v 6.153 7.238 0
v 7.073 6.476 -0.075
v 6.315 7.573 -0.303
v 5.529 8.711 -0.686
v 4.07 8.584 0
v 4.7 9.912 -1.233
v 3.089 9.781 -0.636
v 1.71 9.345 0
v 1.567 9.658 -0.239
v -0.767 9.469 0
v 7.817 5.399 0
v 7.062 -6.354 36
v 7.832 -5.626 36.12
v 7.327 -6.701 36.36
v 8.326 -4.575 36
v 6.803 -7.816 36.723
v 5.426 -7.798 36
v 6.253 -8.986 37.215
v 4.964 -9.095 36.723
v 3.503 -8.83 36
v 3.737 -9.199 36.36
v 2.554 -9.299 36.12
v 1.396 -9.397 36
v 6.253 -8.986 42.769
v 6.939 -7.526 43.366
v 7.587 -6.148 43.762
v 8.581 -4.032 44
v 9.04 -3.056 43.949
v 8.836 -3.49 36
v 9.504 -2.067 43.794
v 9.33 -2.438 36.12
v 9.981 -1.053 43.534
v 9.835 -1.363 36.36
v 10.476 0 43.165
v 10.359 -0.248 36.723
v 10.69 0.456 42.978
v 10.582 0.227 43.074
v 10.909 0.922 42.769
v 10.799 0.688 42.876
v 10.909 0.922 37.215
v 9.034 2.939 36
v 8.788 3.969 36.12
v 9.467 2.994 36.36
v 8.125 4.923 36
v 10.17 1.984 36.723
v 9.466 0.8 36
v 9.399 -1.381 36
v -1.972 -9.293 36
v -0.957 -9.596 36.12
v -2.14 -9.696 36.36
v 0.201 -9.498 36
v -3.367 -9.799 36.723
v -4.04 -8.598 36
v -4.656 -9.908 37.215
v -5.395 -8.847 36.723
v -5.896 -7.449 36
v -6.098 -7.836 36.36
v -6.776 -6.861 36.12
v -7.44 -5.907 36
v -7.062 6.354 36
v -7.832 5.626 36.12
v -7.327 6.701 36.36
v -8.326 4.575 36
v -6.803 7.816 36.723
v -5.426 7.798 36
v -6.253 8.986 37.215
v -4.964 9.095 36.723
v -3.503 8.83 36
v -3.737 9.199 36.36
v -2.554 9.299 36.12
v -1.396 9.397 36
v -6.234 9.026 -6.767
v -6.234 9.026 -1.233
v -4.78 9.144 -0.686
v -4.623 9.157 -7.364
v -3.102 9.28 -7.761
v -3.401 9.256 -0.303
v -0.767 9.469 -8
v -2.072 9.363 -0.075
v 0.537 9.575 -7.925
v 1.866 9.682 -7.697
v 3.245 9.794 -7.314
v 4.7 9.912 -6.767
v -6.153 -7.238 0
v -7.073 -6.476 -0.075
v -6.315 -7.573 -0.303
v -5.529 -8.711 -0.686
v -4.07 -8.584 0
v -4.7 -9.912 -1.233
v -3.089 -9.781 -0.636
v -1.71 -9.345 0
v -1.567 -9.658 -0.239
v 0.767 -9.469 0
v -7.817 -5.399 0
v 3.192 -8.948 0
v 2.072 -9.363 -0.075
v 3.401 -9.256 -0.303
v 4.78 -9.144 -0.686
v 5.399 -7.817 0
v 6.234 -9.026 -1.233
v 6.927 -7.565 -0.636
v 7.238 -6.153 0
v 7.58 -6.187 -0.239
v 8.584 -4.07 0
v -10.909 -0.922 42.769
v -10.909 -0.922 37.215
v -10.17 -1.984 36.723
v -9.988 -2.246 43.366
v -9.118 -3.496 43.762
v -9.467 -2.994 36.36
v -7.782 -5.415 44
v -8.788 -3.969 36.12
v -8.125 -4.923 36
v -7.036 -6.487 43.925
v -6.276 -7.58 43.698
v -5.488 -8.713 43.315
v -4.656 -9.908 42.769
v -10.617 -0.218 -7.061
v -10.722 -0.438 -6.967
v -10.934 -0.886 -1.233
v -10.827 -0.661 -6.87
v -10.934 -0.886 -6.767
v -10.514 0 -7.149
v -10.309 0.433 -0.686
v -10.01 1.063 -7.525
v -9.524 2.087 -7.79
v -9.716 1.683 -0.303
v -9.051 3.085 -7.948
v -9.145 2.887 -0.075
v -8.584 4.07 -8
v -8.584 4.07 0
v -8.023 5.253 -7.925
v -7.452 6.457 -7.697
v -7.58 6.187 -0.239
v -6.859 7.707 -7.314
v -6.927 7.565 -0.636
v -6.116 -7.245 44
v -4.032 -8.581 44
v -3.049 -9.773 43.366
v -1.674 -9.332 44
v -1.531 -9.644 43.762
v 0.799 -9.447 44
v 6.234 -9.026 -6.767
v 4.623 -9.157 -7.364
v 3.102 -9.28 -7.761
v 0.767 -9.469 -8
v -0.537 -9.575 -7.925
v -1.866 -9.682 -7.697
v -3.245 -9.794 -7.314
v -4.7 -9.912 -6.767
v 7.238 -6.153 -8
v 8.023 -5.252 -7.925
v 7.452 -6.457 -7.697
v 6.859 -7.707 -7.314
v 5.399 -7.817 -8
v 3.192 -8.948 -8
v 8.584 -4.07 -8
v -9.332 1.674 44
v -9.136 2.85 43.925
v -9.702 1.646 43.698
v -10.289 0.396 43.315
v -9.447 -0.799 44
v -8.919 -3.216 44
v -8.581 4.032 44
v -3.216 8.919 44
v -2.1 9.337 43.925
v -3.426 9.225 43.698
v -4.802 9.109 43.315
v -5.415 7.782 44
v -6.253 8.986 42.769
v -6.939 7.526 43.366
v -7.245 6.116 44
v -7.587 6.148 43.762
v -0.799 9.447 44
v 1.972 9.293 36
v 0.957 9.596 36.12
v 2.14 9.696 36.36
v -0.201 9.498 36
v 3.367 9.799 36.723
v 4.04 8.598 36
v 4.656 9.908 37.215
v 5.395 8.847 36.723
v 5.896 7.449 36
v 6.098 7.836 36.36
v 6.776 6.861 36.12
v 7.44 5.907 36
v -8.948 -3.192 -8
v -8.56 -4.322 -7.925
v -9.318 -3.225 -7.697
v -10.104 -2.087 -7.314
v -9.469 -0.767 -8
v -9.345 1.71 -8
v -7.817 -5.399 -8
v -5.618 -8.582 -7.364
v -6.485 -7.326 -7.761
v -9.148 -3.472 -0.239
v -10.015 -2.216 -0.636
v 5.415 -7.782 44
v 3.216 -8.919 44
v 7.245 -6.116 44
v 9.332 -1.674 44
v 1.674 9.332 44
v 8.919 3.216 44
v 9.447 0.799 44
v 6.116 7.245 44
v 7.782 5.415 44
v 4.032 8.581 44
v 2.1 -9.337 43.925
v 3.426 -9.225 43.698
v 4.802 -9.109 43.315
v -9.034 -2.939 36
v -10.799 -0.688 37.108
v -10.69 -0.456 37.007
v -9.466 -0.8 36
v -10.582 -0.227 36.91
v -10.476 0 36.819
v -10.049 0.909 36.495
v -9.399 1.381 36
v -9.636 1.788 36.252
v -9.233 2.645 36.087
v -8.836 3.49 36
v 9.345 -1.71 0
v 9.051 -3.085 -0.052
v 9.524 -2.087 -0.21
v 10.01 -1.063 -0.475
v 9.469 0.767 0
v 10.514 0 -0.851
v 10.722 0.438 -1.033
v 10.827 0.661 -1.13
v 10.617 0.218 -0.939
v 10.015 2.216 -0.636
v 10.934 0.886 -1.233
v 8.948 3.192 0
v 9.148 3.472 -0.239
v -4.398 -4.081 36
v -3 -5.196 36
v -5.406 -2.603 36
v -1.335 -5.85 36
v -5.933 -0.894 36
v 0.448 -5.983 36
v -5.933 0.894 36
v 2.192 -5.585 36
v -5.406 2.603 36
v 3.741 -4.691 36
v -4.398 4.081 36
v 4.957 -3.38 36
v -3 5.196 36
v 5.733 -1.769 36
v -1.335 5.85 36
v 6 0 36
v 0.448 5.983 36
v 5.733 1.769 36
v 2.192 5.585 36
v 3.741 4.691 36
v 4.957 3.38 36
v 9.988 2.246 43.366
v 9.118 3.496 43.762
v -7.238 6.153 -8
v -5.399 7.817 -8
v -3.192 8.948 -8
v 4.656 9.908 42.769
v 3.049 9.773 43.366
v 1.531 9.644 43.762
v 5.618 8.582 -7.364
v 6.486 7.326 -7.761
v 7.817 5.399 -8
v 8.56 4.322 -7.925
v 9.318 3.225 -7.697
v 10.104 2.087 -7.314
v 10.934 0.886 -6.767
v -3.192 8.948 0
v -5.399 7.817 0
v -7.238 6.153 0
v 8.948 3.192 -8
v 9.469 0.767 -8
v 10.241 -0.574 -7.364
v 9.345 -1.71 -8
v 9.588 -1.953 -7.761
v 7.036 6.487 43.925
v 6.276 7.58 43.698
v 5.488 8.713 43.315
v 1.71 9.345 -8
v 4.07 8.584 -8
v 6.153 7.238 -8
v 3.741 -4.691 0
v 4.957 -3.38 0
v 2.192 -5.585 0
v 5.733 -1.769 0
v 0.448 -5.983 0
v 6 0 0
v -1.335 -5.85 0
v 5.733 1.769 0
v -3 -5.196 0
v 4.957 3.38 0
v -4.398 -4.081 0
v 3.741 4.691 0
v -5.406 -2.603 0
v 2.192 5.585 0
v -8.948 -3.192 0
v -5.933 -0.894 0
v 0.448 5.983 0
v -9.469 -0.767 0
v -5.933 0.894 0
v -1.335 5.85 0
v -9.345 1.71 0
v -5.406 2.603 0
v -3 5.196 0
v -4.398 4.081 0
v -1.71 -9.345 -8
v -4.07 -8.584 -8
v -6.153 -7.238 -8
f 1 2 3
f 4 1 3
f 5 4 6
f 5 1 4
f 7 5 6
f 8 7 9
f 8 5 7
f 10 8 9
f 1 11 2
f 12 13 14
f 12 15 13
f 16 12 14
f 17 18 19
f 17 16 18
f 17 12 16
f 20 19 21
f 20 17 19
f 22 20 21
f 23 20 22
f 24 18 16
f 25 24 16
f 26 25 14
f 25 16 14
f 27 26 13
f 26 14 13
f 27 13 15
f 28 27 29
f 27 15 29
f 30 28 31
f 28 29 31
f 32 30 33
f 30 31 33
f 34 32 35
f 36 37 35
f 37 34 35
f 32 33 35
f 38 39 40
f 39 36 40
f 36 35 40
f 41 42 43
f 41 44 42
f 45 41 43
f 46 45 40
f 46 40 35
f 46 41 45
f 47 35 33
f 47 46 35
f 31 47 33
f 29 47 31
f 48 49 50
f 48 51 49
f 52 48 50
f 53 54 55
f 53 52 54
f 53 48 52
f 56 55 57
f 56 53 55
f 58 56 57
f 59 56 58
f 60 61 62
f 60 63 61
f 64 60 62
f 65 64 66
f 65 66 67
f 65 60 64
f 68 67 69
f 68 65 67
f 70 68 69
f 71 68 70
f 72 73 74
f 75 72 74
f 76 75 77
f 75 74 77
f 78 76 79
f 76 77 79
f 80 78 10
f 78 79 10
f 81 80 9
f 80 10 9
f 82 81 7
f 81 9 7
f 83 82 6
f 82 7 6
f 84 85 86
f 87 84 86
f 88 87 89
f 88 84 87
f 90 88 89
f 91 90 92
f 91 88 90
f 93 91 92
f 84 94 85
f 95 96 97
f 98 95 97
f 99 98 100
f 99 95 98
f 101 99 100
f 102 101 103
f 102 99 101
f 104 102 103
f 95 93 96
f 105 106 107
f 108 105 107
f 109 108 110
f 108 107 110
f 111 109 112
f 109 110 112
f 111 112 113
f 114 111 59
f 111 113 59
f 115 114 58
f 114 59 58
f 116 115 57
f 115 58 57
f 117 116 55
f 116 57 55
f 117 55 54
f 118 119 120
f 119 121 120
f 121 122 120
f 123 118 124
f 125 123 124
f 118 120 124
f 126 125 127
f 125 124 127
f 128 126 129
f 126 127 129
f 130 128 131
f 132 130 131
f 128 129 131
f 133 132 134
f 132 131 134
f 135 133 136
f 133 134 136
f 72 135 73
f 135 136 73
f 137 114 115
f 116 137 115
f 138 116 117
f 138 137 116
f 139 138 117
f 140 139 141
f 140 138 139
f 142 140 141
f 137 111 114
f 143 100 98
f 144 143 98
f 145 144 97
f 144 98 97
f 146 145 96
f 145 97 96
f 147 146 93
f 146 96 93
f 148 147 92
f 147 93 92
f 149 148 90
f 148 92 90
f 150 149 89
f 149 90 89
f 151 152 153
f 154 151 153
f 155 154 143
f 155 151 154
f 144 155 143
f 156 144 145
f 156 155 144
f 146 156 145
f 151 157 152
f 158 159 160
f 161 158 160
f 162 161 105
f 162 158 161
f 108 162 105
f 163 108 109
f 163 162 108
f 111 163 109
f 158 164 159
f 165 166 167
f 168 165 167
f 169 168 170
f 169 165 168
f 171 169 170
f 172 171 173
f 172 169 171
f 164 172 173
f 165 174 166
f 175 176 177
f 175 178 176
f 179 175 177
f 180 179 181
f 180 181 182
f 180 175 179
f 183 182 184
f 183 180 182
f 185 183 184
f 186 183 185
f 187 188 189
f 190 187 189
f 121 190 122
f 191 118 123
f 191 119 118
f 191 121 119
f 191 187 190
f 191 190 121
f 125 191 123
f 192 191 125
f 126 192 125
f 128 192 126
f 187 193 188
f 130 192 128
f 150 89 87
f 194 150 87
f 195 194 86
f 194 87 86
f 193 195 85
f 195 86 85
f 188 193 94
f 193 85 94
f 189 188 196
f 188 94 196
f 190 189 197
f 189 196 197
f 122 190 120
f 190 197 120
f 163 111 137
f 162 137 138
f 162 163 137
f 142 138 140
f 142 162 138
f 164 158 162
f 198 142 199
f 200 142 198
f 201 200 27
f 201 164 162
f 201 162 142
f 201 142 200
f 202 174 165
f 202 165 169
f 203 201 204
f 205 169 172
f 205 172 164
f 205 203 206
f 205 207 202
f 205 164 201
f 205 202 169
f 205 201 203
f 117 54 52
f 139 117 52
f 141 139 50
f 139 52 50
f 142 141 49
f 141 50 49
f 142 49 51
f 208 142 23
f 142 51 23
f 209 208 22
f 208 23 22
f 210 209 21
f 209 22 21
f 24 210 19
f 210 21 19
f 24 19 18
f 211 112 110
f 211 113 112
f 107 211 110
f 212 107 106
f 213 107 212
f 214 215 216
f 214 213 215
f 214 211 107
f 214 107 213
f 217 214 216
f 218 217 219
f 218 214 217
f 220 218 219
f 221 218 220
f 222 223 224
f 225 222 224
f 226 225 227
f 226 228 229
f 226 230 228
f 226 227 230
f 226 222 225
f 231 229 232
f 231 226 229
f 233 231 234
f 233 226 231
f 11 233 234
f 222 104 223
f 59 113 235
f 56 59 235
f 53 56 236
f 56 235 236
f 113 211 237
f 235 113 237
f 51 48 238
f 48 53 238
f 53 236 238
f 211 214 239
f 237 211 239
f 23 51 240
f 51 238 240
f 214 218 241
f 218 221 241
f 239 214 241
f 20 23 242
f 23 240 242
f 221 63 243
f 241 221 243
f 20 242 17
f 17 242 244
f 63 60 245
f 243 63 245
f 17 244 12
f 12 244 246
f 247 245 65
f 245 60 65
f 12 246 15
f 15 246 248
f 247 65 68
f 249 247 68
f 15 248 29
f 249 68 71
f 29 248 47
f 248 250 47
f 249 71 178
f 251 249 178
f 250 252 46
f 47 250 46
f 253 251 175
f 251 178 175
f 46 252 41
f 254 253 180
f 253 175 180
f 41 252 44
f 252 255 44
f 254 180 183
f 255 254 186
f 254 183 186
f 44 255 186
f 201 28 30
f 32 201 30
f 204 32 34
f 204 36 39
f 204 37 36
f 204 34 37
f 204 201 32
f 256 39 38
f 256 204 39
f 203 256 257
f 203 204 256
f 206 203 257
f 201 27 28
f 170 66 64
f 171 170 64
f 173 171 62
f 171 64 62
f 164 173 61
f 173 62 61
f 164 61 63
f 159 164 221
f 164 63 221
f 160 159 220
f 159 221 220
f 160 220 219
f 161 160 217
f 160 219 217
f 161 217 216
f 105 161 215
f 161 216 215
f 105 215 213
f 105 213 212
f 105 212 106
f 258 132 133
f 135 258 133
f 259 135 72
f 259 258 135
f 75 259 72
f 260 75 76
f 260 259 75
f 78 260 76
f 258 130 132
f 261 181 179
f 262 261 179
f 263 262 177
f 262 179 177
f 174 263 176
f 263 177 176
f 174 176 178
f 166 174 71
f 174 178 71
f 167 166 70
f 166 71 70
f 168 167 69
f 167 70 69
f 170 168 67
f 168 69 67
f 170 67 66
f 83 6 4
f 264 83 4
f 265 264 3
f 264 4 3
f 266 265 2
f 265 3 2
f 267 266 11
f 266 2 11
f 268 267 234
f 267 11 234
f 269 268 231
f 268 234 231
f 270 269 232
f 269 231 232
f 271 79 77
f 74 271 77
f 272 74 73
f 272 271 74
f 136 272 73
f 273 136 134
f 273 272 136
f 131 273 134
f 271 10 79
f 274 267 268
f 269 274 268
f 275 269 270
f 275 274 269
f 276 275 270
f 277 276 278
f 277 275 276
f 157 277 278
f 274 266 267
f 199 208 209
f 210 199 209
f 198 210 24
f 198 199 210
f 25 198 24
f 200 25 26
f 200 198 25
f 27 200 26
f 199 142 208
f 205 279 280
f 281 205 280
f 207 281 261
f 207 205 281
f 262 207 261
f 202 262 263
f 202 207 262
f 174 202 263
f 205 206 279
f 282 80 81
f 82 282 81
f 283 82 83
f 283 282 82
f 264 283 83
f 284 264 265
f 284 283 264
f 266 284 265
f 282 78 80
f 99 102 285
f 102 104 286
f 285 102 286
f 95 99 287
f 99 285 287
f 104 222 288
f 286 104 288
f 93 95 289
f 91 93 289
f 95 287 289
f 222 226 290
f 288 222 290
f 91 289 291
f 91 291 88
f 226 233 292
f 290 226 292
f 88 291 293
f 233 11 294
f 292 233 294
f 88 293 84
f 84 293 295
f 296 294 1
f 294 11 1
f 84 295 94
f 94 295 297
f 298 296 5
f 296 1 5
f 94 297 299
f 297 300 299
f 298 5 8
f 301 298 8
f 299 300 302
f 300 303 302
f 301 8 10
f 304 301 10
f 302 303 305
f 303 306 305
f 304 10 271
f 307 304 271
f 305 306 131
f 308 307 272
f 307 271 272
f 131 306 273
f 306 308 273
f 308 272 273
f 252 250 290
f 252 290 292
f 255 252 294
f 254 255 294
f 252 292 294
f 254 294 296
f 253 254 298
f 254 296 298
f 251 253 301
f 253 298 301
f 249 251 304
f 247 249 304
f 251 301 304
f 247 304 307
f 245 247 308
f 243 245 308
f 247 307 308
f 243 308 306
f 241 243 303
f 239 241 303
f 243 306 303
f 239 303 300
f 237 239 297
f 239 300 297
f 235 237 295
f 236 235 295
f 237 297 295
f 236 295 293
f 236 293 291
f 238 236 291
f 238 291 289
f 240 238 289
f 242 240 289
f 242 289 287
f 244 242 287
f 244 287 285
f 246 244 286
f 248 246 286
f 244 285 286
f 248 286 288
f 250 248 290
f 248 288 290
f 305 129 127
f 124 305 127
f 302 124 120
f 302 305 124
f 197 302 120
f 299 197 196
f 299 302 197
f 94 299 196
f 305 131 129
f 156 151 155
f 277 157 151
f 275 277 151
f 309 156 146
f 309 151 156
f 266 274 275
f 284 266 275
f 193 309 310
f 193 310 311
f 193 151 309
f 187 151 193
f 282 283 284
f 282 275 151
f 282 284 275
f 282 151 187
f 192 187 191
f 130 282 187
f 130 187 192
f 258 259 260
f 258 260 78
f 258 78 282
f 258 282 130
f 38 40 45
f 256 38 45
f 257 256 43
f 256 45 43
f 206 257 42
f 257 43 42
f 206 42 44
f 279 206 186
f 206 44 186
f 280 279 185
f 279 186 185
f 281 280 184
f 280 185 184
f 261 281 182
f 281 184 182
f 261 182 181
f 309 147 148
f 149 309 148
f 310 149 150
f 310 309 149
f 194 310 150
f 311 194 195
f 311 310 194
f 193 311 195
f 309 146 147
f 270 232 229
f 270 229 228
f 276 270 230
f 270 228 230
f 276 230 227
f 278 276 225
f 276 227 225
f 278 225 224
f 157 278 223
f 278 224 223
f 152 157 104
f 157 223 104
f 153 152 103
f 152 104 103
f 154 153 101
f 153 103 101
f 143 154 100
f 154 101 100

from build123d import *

# Parameters (mm, degrees)
SKETCH1_R           = 6
BOSS_EXTRUDE1_DEPTH = 36
BOSS_EXTRUDE2_DEPTH = 8
SKETCH3_OUTSIDE_W   = 53.532
SKETCH3_OUTSIDE_H   = 51.488
SKETCH3_OUTSIDE_R   = 9.5
CUT_EXTRUDE1_DEPTH  = 8
CUT_EXTRUDE1_DRAFT  = -50
SKETCH4_OUTSIDE_W   = 53.532
SKETCH4_OUTSIDE_H   = 51.488
SKETCH4_OUTSIDE_R   = 9.5
CUT_EXTRUDE3_DEPTH  = 8
CUT_EXTRUDE3_DRAFT  = -50
BOSS_EXTRUDE3_DEPTH = 8
SKETCH6_OUTSIDE_W   = 54.894
SKETCH6_OUTSIDE_H   = 52.85
SKETCH6_OUTSIDE_R   = 9.5
CUT_EXTRUDE6_DEPTH  = 8
CUT_EXTRUDE6_DRAFT  = -50
SKETCH7_OUTSIDE_W   = 54.894
SKETCH7_OUTSIDE_H   = 52.85
SKETCH7_OUTSIDE_R   = 9.481063721
CUT_EXTRUDE7_DEPTH  = 8
CUT_EXTRUDE7_DRAFT  = -50


with BuildPart() as part:
    # Sketch1 → Boss-Extrude1 (new body)
    with BuildSketch(Plane.XY):
        Circle(SKETCH1_R)
    extrude(amount=BOSS_EXTRUDE1_DEPTH)

    # Sketch2 → Boss-Extrude2 (add)
    with BuildSketch(Plane(origin=(0, 0, 0), x_dir=(-1, 0, 0), z_dir=(0, 0, -1))):
        Polygon((-10.93381737, 0.885985919), (-6.234194998, -9.025970644), (4.699622372, -9.911956562), (10.93381737, -0.885985919), (6.234194998, 9.025970644), (-4.699622372, 9.911956562), align=None)
    extrude(amount=BOSS_EXTRUDE2_DEPTH)


with BuildPart() as cut_extrude1_tool:
    # Sketch3 outside → Cut-Extrude1 (with draft: the straight prism first)
    with BuildSketch(Plane.XY):
        Rectangle(SKETCH3_OUTSIDE_W, SKETCH3_OUTSIDE_H)
        Circle(SKETCH3_OUTSIDE_R, mode=Mode.SUBTRACT)
    extrude(amount=-CUT_EXTRUDE1_DEPTH)
    # Cut-Extrude1: the draft: its side faces are tilted about the plane it starts from
    cut_extrude1_sides = [cut_extrude1_tool.faces().sort_by_distance(p)[0] for p in [
        (0, -25.744, -4),
        (26.766, 0, -4),
        (0, 25.744, -4),
        (-26.766, 0, -4),
        (-9.5, 0, -4),
    ]]
    draft(cut_extrude1_sides, Plane.XY, CUT_EXTRUDE1_DRAFT)


with BuildPart() as part_1:
    add(part.part)

    # Cut-Extrude1: cut by cut_extrude1_tool
    add(cut_extrude1_tool.part, mode=Mode.SUBTRACT)


with BuildPart() as cut_extrude3_tool:
    # Sketch4 outside → Cut-Extrude3 (with draft: the straight prism first)
    with BuildSketch(Plane(origin=(0, 0, -8), x_dir=(-1, 0, 0), z_dir=(0, 0, -1))):
        Rectangle(SKETCH4_OUTSIDE_W, SKETCH4_OUTSIDE_H)
        Circle(SKETCH4_OUTSIDE_R, mode=Mode.SUBTRACT)
    extrude(amount=-CUT_EXTRUDE3_DEPTH)
    # Cut-Extrude3: the draft: its side faces are tilted about the plane it starts from
    cut_extrude3_sides = [cut_extrude3_tool.faces().sort_by_distance(p)[0] for p in [
        (0, -25.744, -4),
        (-26.766, 0, -4),
        (0, 25.744, -4),
        (26.766, 0, -4),
        (9.5, 0, -4),
    ]]
    draft(cut_extrude3_sides, Plane(origin=(0, 0, -8), x_dir=(-1, 0, 0), z_dir=(0, 0, -1)), CUT_EXTRUDE3_DRAFT)


with BuildPart() as part_2:
    add(part_1.part)

    # Cut-Extrude3: cut by cut_extrude3_tool
    add(cut_extrude3_tool.part, mode=Mode.SUBTRACT)

    # Sketch5 → Boss-Extrude3 (add)
    with BuildSketch(Plane.XY.offset(36)):
        Polygon((-6.252986911, 8.986336688), (-10.908889314, -0.92207717), (-4.655902404, -9.908413858), (6.252986911, -8.986336688), (10.908889314, 0.92207717), (4.655902404, 9.908413858), align=None)
    extrude(amount=BOSS_EXTRUDE3_DEPTH)


with BuildPart() as cut_extrude6_tool:
    # Sketch6 outside → Cut-Extrude6 (with draft: the straight prism first)
    with BuildSketch(Plane(origin=(0, 0, 36), x_dir=(-1, 0, 0), z_dir=(0, 0, -1))):
        Rectangle(SKETCH6_OUTSIDE_W, SKETCH6_OUTSIDE_H)
        Circle(SKETCH6_OUTSIDE_R, mode=Mode.SUBTRACT)
    extrude(amount=-CUT_EXTRUDE6_DEPTH)
    # Cut-Extrude6: the draft: its side faces are tilted about the plane it starts from
    cut_extrude6_sides = [cut_extrude6_tool.faces().sort_by_distance(p)[0] for p in [
        (0, -26.425, 40),
        (-27.447, 0, 40),
        (0, 26.425, 40),
        (27.447, 0, 40),
        (9.5, 0, 40),
    ]]
    draft(cut_extrude6_sides, Plane(origin=(0, 0, 36), x_dir=(-1, 0, 0), z_dir=(0, 0, -1)), CUT_EXTRUDE6_DRAFT)


with BuildPart() as part_3:
    add(part_2.part)

    # Cut-Extrude6: cut by cut_extrude6_tool
    add(cut_extrude6_tool.part, mode=Mode.SUBTRACT)


with BuildPart() as cut_extrude7_tool:
    # Sketch7 outside → Cut-Extrude7 (with draft: the straight prism first)
    with BuildSketch(Plane.XY.offset(44)):
        Rectangle(SKETCH7_OUTSIDE_W, SKETCH7_OUTSIDE_H)
        Circle(SKETCH7_OUTSIDE_R, mode=Mode.SUBTRACT)
    extrude(amount=-CUT_EXTRUDE7_DEPTH)
    # Cut-Extrude7: the draft: its side faces are tilted about the plane it starts from
    cut_extrude7_sides = [cut_extrude7_tool.faces().sort_by_distance(p)[0] for p in [
        (0, -26.425, 40),
        (27.447, 0, 40),
        (0, 26.425, 40),
        (-27.447, 0, 40),
        (-9.481063721, 0, 40),
    ]]
    draft(cut_extrude7_sides, Plane.XY.offset(44), CUT_EXTRUDE7_DRAFT)


with BuildPart() as part_4:
    add(part_3.part)

    # Cut-Extrude7: cut by cut_extrude7_tool
    add(cut_extrude7_tool.part, mode=Mode.SUBTRACT)


solid = part_4.part
